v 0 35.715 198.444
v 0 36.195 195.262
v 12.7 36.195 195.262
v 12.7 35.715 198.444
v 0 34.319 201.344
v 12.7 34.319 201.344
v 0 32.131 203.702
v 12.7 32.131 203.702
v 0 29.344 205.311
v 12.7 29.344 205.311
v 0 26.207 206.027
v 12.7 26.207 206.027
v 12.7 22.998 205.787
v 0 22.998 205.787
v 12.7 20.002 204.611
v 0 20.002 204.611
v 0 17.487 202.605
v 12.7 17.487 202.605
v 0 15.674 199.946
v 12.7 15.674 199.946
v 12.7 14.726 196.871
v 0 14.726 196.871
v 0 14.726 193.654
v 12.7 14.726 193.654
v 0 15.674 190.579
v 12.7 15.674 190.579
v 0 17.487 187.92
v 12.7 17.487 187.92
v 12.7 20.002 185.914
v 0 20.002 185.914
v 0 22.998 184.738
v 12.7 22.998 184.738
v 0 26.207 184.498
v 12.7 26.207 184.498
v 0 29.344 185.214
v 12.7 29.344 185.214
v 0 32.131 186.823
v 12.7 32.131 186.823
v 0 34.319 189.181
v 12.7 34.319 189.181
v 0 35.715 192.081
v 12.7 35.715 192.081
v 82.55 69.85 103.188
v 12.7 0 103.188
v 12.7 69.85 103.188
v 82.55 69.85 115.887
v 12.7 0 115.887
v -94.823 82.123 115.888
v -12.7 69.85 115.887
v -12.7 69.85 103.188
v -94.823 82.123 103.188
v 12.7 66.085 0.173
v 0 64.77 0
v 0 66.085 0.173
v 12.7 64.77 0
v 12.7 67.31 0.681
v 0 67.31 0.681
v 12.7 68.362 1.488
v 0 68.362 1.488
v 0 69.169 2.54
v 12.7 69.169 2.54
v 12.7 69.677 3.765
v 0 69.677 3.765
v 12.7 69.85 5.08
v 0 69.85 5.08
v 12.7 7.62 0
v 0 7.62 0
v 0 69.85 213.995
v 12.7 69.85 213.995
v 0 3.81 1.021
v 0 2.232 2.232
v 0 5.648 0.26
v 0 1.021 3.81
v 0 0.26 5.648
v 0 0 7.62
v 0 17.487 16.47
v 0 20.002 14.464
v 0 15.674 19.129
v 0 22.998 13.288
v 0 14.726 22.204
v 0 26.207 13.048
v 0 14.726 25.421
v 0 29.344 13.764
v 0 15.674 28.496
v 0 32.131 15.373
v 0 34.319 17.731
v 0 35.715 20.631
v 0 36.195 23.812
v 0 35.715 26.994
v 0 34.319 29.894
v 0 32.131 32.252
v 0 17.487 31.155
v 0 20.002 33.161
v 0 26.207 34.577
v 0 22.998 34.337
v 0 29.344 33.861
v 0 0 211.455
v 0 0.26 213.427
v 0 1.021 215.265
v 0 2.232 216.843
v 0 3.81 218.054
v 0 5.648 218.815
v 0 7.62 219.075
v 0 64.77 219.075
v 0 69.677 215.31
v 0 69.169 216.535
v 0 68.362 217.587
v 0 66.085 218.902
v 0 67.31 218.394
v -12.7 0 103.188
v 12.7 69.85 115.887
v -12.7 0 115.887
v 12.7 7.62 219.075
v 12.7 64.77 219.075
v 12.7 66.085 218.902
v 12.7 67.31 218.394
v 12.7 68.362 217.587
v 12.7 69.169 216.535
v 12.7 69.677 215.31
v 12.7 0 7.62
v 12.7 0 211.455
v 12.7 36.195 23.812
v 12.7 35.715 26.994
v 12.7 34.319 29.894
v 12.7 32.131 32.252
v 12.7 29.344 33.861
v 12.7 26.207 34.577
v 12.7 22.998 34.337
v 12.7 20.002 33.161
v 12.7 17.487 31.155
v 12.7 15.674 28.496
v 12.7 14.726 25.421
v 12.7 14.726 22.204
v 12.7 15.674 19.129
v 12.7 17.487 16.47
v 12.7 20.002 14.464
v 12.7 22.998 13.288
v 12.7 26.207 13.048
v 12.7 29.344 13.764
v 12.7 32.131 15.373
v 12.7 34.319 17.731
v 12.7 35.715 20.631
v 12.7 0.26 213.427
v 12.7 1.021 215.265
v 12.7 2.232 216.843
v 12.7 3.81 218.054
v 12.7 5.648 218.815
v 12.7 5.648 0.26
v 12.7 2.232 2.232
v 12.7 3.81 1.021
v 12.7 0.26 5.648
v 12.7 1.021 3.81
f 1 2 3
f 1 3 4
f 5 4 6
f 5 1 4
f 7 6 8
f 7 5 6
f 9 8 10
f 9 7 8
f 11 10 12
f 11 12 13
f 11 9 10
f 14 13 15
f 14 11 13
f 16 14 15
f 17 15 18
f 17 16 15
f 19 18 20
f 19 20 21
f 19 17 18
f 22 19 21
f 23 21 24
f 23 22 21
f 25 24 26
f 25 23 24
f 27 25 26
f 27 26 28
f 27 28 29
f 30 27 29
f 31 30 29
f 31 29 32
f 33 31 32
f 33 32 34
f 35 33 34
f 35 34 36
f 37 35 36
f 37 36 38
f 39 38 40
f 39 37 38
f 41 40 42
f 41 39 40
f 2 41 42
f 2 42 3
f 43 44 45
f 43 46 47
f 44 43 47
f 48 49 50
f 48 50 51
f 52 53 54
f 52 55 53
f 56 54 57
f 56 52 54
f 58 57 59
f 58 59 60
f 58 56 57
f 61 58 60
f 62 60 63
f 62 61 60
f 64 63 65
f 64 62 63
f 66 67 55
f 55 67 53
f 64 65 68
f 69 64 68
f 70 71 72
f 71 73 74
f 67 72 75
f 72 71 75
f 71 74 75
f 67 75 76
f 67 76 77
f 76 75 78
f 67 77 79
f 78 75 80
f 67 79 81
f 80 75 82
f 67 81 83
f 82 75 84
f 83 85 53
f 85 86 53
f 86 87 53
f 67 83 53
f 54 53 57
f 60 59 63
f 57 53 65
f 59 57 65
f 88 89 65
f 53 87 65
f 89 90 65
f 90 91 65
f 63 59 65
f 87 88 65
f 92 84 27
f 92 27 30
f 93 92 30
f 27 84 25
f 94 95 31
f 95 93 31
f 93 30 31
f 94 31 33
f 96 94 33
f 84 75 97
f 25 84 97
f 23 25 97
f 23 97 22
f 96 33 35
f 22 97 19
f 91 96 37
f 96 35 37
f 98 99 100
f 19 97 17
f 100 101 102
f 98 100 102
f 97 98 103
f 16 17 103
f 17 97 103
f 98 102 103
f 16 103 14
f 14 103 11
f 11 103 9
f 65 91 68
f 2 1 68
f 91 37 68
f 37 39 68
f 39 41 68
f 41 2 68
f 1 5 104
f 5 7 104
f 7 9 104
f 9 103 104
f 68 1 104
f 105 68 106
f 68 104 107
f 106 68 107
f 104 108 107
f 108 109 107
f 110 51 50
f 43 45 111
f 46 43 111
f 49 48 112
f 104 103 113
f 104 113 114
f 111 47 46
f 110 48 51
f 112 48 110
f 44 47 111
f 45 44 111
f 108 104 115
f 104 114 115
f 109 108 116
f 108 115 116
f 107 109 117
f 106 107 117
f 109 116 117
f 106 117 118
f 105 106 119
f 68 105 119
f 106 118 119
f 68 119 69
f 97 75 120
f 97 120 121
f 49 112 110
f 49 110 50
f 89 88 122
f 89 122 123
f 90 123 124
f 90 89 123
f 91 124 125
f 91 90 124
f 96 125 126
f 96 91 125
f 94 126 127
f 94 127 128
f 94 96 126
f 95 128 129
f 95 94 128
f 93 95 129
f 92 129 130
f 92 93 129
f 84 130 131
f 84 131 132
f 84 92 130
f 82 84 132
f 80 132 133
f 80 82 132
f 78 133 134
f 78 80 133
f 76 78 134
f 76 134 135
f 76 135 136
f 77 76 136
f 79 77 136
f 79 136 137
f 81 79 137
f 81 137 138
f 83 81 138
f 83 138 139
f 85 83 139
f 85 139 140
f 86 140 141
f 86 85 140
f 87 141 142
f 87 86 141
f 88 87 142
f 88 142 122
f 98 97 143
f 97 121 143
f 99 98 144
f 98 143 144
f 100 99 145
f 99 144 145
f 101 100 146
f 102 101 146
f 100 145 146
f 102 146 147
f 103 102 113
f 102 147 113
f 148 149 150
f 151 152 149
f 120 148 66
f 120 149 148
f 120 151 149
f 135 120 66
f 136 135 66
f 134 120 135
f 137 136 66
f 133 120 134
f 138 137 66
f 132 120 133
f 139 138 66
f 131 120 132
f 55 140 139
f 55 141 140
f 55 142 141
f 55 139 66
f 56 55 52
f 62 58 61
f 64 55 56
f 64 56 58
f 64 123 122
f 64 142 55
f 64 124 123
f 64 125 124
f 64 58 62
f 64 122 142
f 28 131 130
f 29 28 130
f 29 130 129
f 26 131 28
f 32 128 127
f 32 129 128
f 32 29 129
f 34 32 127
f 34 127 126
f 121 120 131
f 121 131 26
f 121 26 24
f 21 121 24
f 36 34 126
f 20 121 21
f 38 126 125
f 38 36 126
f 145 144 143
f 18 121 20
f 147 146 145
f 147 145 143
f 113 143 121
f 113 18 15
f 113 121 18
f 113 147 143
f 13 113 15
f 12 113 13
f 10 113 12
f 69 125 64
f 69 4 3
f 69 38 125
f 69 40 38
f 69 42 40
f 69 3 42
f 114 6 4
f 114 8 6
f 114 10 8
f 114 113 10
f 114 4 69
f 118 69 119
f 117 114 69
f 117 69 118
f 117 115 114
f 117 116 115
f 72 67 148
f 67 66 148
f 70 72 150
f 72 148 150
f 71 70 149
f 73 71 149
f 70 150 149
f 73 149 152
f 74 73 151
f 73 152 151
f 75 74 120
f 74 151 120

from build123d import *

# Parameters (mm, degrees)
F0_W      = 69.85
F0_H      = 219.075
F0_R      = 10.795
F1_DEPTH  = 12.7
F2_R      = 5.08
F3_R      = 7.62
F4_W      = 69.85
F4_H      = 12.7
F5_DEPTH  = 69.85
F7_DEPTH  = 115.8885
F10_DEPTH = 12.7


with BuildPart() as f1:
    # F0 (on Right) → F1 (new body)
    with BuildSketch(Plane.YZ):
        with Locations((34.925, 109.5375)):
            Rectangle(F0_W, F0_H)
        with Locations((25.4, 23.8125)):
            Circle(F0_R, mode=Mode.SUBTRACT)
        with Locations((25.4, 195.2625)):
            Circle(F0_R, mode=Mode.SUBTRACT)
    extrude(amount=F1_DEPTH)

    # F2
    f2_edges = [f1.edges().sort_by_distance(p)[0] for p in [
        (6.35, 69.85, 219.075),
        (6.35, 69.85, 0),
    ]]
    fillet(f2_edges, radius=F2_R)

    # F3
    f3_edges = [f1.edges().sort_by_distance(p)[0] for p in [
        (6.35, 0, 219.075),
        (6.35, 0, 0),
    ]]
    fillet(f3_edges, radius=F3_R)


with BuildPart() as f5:
    # F4 (on face) → F5 (new body)
    with BuildSketch(Plane.YZ.offset(12.7)):
        with Locations((34.925, 109.5375)):
            Rectangle(F4_W, F4_H)
    extrude(amount=F5_DEPTH)

    # F6 (on face) → F7 (cut, through all)
    with BuildSketch(Plane.XY.offset(115.8875)):
        Polygon((82.55, 0), (82.55, 69.85), (12.7, 0), align=None)
    extrude(amount=-F7_DEPTH, mode=Mode.SUBTRACT)


with BuildPart() as f8_1:
    # F8: instance of F5
    add(f5.part.mirror(Plane(origin=(0, 35.436059, 109.5375), x_dir=(0, 1, 0), z_dir=(-1, 0, 0))))

    # F9 (on face) → F10 (join, through all)
    with BuildSketch(Plane.XY.offset(115.8875)):
        Polygon((-82.55, 69.85), (-12.7, 69.85), (-94.823429, 82.123429), align=None)
    extrude(amount=-F10_DEPTH)


solid = Compound([f1.part, f5.part, f8_1.part])
